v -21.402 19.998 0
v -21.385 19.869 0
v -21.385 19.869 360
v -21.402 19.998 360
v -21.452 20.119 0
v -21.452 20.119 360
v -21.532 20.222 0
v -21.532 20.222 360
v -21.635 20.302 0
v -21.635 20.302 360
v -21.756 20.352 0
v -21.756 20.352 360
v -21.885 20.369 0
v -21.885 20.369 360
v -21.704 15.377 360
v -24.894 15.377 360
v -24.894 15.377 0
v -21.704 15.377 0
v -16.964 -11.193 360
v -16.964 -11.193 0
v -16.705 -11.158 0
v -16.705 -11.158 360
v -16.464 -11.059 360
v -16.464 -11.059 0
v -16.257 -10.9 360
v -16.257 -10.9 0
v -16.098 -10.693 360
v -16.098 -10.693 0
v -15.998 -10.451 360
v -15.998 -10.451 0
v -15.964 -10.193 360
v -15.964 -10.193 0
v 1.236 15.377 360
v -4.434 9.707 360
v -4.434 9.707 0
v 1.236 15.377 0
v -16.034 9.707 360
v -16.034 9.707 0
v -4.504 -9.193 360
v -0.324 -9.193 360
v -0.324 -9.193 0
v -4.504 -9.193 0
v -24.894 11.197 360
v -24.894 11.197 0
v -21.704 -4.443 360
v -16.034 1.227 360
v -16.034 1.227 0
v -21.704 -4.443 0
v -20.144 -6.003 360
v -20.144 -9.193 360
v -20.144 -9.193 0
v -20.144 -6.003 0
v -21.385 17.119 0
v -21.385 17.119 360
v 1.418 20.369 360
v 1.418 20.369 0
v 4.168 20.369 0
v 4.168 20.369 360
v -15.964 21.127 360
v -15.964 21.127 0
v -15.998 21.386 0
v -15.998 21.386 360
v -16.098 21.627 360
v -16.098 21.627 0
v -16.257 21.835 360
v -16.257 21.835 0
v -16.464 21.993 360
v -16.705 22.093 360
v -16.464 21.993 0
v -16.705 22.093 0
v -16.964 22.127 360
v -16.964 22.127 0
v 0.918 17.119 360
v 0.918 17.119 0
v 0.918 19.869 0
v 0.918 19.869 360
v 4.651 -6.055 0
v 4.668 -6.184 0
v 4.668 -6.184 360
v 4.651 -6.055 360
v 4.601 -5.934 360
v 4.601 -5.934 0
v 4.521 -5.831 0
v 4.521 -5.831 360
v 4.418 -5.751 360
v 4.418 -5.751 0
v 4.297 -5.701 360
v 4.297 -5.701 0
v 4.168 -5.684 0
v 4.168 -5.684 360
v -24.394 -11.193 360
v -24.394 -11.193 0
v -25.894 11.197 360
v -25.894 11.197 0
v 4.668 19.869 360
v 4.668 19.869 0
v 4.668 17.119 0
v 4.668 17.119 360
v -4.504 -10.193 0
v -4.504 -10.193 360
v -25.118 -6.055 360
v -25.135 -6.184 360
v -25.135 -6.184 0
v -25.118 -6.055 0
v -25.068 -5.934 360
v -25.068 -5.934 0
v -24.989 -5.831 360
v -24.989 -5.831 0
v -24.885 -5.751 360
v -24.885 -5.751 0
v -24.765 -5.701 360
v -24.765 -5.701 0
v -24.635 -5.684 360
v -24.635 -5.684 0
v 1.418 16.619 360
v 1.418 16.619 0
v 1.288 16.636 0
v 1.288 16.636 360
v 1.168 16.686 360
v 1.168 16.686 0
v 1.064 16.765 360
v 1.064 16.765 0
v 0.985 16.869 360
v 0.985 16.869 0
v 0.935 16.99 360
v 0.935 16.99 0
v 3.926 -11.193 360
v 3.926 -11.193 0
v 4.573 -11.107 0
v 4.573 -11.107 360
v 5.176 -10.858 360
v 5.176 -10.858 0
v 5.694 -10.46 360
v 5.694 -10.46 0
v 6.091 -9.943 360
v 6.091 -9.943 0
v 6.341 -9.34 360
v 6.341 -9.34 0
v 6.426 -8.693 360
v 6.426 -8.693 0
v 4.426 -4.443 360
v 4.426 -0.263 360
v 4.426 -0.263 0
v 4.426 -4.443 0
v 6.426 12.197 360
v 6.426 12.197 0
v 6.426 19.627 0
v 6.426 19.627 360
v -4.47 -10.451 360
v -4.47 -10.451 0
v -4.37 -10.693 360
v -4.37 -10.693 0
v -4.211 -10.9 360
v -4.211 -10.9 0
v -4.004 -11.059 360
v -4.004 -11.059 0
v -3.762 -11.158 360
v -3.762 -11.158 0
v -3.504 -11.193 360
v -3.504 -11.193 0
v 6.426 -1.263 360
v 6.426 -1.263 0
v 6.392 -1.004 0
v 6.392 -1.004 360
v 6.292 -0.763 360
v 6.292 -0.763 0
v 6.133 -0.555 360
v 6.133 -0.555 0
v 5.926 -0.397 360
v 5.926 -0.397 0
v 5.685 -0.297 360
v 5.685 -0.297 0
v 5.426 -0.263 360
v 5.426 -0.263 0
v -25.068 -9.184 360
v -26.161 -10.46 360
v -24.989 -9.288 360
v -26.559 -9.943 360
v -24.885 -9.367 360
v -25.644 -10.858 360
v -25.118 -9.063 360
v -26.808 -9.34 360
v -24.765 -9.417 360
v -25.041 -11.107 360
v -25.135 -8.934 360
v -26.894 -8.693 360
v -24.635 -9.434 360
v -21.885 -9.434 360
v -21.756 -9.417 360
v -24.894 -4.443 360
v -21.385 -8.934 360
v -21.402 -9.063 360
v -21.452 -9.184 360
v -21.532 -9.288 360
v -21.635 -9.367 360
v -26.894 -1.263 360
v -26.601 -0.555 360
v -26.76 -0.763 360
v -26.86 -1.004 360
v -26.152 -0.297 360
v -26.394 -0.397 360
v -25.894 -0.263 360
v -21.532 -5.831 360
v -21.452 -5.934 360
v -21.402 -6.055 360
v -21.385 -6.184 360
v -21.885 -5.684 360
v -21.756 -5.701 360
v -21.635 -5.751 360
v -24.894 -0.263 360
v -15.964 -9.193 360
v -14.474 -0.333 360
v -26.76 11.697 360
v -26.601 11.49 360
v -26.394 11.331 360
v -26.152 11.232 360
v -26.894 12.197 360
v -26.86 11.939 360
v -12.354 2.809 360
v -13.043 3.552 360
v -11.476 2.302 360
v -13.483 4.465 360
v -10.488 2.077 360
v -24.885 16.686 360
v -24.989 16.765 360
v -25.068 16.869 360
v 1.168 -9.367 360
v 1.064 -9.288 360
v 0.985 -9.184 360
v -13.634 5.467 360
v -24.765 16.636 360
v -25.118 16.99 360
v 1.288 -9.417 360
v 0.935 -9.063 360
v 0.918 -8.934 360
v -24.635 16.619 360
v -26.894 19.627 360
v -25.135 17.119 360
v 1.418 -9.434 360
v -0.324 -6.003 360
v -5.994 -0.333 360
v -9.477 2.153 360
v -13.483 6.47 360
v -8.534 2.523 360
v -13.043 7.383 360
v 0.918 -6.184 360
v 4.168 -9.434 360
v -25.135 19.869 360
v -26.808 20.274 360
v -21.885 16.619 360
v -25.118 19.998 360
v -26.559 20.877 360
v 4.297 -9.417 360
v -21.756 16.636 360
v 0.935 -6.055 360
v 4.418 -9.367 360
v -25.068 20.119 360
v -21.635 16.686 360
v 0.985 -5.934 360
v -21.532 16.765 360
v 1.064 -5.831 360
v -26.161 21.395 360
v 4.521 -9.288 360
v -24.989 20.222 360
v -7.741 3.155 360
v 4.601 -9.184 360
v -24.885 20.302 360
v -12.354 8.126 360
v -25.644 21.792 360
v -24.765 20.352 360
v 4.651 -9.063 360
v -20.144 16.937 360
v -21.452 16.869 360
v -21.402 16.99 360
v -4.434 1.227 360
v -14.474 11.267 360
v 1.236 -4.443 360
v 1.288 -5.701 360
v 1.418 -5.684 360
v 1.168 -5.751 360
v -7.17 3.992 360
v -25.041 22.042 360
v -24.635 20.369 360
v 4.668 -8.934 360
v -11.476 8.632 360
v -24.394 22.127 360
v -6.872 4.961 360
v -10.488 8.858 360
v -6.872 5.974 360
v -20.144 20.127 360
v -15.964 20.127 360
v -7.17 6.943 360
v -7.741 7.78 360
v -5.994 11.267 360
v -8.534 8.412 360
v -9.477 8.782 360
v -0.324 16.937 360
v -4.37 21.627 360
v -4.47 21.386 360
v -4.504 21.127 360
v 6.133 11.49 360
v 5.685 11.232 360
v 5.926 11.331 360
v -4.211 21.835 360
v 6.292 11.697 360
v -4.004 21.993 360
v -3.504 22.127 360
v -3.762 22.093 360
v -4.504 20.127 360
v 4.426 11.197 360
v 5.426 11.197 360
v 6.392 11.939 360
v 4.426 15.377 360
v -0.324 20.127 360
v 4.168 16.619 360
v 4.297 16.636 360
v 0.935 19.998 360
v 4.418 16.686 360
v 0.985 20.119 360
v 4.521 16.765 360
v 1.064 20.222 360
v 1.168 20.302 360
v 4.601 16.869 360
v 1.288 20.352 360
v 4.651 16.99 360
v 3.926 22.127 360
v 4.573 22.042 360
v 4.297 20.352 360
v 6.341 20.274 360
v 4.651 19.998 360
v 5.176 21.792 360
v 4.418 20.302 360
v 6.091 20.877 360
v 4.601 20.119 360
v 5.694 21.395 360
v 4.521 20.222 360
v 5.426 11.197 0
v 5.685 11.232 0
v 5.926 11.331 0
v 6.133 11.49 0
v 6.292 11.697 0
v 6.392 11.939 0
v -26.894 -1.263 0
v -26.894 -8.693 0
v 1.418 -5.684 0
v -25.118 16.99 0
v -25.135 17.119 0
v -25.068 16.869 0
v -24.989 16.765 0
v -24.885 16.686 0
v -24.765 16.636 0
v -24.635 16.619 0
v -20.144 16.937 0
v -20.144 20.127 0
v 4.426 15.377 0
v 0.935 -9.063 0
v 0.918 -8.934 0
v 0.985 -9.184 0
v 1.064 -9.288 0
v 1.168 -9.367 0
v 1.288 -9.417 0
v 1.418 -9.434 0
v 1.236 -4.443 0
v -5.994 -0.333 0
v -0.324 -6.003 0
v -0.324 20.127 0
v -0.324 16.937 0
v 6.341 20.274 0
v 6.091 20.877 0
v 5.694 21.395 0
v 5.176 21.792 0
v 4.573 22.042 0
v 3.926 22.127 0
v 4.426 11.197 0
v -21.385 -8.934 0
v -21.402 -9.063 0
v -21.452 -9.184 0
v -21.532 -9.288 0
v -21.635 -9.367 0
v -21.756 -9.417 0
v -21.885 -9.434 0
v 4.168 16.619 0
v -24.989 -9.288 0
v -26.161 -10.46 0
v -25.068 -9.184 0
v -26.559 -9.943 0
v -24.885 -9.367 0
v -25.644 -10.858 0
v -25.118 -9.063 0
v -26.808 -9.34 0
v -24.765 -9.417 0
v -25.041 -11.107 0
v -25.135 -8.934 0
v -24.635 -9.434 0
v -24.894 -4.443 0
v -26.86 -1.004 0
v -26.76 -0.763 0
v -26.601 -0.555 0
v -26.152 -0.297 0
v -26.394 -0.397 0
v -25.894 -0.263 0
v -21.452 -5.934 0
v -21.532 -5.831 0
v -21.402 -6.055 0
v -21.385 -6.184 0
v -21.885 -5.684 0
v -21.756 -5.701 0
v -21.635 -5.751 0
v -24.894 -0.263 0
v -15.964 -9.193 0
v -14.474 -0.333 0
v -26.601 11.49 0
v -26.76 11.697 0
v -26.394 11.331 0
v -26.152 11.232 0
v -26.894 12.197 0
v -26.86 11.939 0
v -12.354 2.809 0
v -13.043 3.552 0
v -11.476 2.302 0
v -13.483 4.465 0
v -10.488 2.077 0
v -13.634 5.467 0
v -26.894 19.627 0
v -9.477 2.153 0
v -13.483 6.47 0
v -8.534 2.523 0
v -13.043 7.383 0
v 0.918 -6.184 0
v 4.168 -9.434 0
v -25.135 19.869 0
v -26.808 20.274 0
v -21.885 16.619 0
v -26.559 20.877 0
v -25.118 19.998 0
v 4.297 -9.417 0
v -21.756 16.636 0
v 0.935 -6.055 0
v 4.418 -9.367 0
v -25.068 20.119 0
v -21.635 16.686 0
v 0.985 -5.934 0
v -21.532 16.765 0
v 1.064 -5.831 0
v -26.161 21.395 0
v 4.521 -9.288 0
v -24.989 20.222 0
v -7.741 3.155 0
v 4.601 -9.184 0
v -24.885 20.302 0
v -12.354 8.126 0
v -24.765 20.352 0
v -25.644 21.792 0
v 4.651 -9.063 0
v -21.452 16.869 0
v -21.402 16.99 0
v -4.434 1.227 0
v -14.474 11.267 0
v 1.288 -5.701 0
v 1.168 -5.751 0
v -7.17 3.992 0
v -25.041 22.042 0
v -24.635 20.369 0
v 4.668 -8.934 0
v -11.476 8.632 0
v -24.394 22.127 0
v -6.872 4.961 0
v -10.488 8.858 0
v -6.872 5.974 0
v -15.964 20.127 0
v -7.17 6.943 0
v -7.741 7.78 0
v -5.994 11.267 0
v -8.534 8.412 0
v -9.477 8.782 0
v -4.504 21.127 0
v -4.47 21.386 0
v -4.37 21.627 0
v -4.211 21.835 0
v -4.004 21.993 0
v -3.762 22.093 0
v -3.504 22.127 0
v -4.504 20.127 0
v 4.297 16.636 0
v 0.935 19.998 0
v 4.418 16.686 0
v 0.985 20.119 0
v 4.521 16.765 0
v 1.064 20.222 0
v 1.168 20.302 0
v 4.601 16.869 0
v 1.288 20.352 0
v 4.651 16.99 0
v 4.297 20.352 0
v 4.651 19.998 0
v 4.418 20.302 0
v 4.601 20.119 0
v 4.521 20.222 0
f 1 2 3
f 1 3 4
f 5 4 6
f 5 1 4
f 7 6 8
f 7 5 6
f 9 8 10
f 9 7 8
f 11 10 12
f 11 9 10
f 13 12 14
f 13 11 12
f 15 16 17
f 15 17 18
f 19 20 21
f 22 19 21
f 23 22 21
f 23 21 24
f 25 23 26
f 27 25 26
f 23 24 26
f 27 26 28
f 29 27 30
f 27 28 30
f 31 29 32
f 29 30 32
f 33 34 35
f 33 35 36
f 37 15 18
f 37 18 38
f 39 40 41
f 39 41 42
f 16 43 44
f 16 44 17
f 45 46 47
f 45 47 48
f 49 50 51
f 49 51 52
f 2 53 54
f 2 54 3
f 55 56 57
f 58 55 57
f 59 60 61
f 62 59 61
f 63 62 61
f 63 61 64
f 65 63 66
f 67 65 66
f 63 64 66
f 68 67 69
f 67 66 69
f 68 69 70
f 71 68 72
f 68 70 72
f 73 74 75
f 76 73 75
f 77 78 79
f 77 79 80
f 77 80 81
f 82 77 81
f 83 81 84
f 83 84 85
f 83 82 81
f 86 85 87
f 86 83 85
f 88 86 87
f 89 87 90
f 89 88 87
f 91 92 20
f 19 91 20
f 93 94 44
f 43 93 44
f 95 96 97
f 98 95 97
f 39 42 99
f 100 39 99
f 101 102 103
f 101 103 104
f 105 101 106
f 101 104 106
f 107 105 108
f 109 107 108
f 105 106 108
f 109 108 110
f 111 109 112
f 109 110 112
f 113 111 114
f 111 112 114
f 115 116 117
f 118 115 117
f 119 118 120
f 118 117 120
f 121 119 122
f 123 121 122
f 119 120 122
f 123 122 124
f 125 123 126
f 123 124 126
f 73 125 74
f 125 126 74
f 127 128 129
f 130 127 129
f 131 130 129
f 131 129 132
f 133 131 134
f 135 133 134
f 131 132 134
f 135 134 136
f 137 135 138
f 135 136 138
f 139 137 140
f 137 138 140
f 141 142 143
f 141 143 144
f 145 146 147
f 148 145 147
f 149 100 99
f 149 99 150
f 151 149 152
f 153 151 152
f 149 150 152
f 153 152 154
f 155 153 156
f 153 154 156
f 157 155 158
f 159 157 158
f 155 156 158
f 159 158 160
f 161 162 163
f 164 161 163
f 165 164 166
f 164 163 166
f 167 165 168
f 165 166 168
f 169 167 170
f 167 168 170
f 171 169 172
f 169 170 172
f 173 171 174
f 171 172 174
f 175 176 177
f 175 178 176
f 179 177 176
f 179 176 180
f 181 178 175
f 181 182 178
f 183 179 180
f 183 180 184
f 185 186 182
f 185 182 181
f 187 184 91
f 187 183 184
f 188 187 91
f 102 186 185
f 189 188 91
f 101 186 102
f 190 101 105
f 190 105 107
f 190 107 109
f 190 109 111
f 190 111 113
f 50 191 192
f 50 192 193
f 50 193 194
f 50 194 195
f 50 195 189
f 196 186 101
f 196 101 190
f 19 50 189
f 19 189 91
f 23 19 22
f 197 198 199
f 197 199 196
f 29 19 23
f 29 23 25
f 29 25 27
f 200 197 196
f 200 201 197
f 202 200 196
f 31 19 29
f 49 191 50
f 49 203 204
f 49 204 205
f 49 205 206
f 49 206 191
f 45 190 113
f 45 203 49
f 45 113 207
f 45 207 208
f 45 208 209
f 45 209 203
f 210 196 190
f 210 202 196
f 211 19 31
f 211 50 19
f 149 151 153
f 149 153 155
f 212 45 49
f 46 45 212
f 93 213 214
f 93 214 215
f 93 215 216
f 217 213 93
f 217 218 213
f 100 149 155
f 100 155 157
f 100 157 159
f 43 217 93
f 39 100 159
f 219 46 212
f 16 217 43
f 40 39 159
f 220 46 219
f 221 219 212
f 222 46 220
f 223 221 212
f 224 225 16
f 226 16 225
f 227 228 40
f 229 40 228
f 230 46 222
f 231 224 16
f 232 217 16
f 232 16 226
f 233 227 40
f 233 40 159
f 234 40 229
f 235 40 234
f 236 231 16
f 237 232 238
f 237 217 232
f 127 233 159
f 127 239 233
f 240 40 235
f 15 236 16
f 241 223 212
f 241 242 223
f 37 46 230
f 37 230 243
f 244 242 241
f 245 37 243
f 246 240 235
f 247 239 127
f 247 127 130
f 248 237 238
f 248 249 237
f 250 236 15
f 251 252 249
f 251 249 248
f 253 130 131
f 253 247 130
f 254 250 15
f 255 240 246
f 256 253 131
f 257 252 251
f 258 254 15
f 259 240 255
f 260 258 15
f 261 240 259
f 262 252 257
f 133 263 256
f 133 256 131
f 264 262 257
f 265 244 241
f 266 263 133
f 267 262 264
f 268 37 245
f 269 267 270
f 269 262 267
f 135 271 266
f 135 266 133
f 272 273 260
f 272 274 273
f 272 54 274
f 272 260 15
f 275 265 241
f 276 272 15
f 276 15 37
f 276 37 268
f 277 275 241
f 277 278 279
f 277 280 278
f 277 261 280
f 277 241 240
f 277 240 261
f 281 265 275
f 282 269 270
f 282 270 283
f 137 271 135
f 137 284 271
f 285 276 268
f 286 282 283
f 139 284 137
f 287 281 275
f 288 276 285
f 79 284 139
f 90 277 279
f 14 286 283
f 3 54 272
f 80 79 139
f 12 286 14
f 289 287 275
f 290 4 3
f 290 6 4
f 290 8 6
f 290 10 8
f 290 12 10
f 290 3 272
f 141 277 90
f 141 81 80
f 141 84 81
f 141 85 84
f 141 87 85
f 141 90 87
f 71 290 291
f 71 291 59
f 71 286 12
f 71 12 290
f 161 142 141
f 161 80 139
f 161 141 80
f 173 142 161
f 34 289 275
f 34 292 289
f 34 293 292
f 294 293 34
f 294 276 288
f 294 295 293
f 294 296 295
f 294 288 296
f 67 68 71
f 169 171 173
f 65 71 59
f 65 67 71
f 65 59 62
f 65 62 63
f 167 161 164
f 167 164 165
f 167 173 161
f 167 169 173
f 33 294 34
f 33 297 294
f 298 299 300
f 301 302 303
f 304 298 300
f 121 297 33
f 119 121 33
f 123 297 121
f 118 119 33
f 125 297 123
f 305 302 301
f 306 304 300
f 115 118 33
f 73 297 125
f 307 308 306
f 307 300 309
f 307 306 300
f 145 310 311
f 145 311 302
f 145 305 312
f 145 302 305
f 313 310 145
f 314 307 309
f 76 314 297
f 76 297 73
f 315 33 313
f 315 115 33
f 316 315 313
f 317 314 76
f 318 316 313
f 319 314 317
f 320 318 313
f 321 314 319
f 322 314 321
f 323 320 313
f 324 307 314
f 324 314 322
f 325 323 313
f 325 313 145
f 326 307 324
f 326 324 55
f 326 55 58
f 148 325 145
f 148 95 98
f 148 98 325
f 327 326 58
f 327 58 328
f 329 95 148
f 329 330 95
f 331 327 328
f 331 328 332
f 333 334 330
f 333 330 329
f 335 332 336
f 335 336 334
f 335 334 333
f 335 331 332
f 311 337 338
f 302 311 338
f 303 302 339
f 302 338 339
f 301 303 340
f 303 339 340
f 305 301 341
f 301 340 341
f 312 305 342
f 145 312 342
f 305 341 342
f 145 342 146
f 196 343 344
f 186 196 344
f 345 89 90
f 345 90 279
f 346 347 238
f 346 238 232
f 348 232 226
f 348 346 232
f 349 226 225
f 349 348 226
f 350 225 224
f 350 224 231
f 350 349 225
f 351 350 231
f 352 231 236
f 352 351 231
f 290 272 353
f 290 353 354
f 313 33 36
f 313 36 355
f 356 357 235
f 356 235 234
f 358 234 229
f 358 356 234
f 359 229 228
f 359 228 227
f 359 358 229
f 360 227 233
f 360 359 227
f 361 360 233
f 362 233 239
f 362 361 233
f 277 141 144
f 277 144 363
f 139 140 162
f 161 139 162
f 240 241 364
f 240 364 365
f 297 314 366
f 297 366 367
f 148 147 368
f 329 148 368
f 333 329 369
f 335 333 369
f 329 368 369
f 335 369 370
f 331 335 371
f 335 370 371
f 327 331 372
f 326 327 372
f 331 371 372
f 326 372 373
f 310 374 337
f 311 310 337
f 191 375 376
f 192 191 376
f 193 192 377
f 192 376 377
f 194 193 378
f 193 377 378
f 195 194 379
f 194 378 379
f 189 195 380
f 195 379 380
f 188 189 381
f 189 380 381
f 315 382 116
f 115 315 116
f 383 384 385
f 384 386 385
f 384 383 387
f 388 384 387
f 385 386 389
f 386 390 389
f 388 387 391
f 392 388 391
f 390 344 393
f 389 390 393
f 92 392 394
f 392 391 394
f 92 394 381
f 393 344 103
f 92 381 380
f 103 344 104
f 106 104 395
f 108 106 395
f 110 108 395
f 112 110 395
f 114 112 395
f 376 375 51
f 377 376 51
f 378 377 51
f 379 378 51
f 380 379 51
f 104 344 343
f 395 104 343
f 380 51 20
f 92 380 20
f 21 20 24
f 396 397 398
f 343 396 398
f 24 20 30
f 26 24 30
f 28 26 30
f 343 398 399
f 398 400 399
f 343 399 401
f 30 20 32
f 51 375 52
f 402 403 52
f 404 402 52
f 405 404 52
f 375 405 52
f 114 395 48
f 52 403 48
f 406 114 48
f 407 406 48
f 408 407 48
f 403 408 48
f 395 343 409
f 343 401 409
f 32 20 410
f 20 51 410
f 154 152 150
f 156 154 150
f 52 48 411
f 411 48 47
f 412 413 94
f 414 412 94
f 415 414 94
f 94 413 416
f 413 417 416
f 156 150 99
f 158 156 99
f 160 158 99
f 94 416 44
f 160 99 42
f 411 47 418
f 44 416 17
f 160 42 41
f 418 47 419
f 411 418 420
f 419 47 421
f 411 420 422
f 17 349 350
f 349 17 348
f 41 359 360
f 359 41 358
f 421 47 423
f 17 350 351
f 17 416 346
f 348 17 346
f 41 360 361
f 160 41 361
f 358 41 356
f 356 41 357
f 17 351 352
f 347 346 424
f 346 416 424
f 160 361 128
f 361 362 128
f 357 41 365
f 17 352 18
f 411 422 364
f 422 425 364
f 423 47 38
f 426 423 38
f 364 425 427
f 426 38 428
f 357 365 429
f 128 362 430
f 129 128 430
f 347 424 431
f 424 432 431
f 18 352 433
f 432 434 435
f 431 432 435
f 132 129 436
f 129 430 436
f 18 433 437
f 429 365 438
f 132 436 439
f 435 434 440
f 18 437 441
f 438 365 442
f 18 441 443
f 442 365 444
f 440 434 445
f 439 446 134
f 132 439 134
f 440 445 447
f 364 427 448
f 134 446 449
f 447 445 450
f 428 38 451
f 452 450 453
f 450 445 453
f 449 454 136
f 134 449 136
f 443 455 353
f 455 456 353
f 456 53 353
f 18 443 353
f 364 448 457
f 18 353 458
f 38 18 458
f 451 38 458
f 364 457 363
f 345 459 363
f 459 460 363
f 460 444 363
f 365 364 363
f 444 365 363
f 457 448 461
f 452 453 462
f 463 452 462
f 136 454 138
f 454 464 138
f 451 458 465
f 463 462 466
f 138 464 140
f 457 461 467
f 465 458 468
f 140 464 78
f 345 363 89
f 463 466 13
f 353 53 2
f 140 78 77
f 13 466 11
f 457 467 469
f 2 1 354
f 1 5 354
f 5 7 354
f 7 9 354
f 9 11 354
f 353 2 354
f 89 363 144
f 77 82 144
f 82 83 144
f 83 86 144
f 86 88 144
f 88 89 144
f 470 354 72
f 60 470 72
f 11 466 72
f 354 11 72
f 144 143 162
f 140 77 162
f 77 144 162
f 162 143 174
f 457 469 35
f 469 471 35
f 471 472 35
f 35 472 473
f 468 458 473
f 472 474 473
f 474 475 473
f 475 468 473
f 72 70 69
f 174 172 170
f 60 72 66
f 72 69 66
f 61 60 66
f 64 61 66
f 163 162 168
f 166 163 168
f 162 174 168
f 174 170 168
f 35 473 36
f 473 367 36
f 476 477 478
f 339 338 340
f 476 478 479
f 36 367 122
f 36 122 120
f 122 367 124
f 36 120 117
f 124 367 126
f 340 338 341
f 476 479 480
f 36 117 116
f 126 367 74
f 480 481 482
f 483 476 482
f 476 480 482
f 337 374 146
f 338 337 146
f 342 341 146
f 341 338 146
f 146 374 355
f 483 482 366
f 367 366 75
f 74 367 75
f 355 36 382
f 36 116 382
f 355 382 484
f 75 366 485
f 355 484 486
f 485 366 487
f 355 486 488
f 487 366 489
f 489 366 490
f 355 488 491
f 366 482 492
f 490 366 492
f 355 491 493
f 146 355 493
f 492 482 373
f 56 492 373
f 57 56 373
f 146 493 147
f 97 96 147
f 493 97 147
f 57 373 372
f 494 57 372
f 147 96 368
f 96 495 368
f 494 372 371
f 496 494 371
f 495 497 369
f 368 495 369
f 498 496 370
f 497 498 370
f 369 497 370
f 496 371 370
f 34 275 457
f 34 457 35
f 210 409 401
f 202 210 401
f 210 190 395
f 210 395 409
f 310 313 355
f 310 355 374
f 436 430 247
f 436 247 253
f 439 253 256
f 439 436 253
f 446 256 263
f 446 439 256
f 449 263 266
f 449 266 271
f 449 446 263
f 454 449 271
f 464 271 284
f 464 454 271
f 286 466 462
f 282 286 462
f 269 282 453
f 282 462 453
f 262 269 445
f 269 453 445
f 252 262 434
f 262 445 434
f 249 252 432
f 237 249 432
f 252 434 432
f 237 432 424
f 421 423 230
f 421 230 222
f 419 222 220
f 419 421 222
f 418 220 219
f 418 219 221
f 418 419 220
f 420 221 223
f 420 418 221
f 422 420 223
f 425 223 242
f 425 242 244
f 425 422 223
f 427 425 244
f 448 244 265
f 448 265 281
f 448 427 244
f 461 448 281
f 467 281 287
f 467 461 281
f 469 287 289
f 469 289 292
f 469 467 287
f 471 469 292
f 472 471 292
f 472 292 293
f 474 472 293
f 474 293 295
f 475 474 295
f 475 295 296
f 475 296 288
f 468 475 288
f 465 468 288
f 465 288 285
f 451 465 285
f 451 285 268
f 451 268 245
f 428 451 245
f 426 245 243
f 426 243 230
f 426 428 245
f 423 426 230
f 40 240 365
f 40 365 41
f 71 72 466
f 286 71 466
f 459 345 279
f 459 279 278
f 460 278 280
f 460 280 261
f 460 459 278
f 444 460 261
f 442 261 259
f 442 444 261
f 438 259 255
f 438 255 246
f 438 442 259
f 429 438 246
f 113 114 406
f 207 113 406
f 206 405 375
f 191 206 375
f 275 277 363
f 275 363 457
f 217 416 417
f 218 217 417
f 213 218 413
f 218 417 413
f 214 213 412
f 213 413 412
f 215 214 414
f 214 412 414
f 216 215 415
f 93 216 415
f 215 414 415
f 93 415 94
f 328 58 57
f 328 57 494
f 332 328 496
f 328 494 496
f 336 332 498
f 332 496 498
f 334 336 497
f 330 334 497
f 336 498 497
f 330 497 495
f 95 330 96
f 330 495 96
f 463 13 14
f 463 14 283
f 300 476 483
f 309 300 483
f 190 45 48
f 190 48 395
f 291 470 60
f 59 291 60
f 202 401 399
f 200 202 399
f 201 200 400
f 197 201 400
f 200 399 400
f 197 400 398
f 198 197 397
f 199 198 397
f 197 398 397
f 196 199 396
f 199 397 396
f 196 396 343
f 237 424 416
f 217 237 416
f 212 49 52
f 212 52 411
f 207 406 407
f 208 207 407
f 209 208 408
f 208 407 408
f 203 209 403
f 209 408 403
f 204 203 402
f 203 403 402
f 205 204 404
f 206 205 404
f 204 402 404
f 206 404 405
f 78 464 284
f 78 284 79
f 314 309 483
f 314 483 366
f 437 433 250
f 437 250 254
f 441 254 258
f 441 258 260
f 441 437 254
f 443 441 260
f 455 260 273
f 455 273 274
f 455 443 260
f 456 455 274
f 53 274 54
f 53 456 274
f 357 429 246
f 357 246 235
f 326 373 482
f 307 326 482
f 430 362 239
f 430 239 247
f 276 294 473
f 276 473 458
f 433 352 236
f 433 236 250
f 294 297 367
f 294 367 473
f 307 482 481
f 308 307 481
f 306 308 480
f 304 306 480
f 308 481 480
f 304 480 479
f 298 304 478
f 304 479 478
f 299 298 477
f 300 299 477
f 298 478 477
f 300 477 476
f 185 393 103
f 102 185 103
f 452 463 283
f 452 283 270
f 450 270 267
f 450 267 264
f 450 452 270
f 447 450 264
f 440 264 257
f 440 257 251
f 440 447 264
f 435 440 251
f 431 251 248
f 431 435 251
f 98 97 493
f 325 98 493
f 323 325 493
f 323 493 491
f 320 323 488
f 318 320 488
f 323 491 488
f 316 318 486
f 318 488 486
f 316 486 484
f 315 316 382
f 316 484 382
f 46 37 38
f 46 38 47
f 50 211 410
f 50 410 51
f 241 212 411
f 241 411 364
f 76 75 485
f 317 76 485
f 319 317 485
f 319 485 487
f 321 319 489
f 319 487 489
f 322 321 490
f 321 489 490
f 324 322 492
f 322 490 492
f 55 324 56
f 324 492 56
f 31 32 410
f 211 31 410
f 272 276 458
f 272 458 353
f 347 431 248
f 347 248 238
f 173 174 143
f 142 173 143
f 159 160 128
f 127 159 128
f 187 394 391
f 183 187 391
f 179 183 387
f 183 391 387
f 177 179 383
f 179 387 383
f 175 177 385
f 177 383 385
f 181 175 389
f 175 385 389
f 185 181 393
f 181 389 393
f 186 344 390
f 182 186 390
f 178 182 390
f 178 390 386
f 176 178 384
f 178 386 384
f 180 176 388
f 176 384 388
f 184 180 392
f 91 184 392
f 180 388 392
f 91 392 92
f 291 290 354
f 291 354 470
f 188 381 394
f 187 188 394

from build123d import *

# Parameters (mm, degrees)
CROQUIS1_R              = 3.4
SALIENTE_EXTRUIR1_DEPTH = 360


with BuildPart() as part:
    # Croquis1 → Saliente-Extruir1 (new body)
    with BuildSketch(Plane.XY):
        with BuildLine():
            Line((-4.433640906, 1.227432273), (-4.433640906, 9.707432273))
            Line((-4.433640906, 9.707432273), (1.236359094, 15.377432273))
            Line((1.236359094, 15.377432273), (4.426359094, 15.377432273))
            Line((4.426359094, 15.377432273), (4.426359094, 11.197432273))
            Line((4.426359094, 11.197432273), (5.426359094, 11.197432273))
            ThreePointArc((5.426359094, 11.197432273), (6.133465875, 11.490325492), (6.426359094, 12.197432273))
            Line((6.426359094, 12.197432273), (6.426359094, 19.627432273))
            ThreePointArc((6.426359094, 19.627432273), (5.694126047, 21.395199226), (3.926359094, 22.127432273))
            Line((3.926359094, 22.127432273), (-3.503640906, 22.127432273))
            ThreePointArc((-3.503640906, 22.127432273), (-4.210747688, 21.834539054), (-4.503640906, 21.127432273))
            Line((-4.503640906, 21.127432273), (-4.503640906, 20.127432273))
            Line((-4.503640906, 20.127432273), (-0.323640906, 20.127432273))
            Line((-0.323640906, 20.127432273), (-0.323640906, 16.937432273))
            Line((-0.323640906, 16.937432273), (-5.993640906, 11.267432273))
            Line((-5.993640906, 11.267432273), (-14.473640906, 11.267432273))
            Line((-14.473640906, 11.267432273), (-20.143640906, 16.937432273))
            Line((-20.143640906, 16.937432273), (-20.143640906, 20.127432273))
            Line((-20.143640906, 20.127432273), (-15.963640906, 20.127432273))
            Line((-15.963640906, 20.127432273), (-15.963640906, 21.127432273))
            ThreePointArc((-15.963640906, 21.127432273), (-16.256534125, 21.834539054), (-16.963640906, 22.127432273))
            Line((-16.963640906, 22.127432273), (-24.393640906, 22.127432273))
            ThreePointArc((-24.393640906, 22.127432273), (-26.161407859, 21.395199226), (-26.893640906, 19.627432273))
            Line((-26.893640906, 19.627432273), (-26.893640906, 12.197432273))
            ThreePointArc((-26.893640906, 12.197432273), (-26.600747688, 11.490325492), (-25.893640906, 11.197432273))
            Line((-25.893640906, 11.197432273), (-24.893640906, 11.197432273))
            Line((-24.893640906, 11.197432273), (-24.893640906, 15.377432273))
            Line((-24.893640906, 15.377432273), (-21.703640906, 15.377432273))
            Line((-21.703640906, 15.377432273), (-16.033640906, 9.707432273))
            Line((-16.033640906, 9.707432273), (-16.033640906, 1.227432273))
            Line((-16.033640906, 1.227432273), (-21.703640906, -4.442567727))
            Line((-21.703640906, -4.442567727), (-24.893640906, -4.442567727))
            Line((-24.893640906, -4.442567727), (-24.893640906, -0.262567727))
            Line((-24.893640906, -0.262567727), (-25.893640906, -0.262567727))
            ThreePointArc((-25.893640906, -0.262567727), (-26.600747688, -0.555460946), (-26.893640906, -1.262567727))
            Line((-26.893640906, -1.262567727), (-26.893640906, -8.692567727))
            ThreePointArc((-26.893640906, -8.692567727), (-26.161407859, -10.46033468), (-24.393640906, -11.192567727))
            Line((-24.393640906, -11.192567727), (-16.963640906, -11.192567727))
            ThreePointArc((-16.963640906, -11.192567727), (-16.256534125, -10.899674508), (-15.963640906, -10.192567727))
            Line((-15.963640906, -10.192567727), (-15.963640906, -9.192567727))
            Line((-15.963640906, -9.192567727), (-20.143640906, -9.192567727))
            Line((-20.143640906, -9.192567727), (-20.143640906, -6.002567727))
            Line((-20.143640906, -6.002567727), (-14.473640906, -0.332567727))
            Line((-14.473640906, -0.332567727), (-5.993640906, -0.332567727))
            Line((-5.993640906, -0.332567727), (-0.323640906, -6.002567727))
            Line((-0.323640906, -6.002567727), (-0.323640906, -9.192567727))
            Line((-0.323640906, -9.192567727), (-4.503640906, -9.192567727))
            Line((-4.503640906, -9.192567727), (-4.503640906, -10.192567727))
            ThreePointArc((-4.503640906, -10.192567727), (-4.210747688, -10.899674508), (-3.503640906, -11.192567727))
            Line((-3.503640906, -11.192567727), (3.926359094, -11.192567727))
            ThreePointArc((3.926359094, -11.192567727), (5.694126047, -10.46033468), (6.426359094, -8.692567727))
            Line((6.426359094, -8.692567727), (6.426359094, -1.262567727))
            ThreePointArc((6.426359094, -1.262567727), (6.133465875, -0.555460946), (5.426359094, -0.262567727))
            Line((5.426359094, -0.262567727), (4.426359094, -0.262567727))
            Line((4.426359094, -0.262567727), (4.426359094, -4.442567727))
            Line((4.426359094, -4.442567727), (1.236359094, -4.442567727))
            Line((1.236359094, -4.442567727), (-4.433640906, 1.227432273))
        make_face()
        with Locations(Location((-10.233640906, 5.467432273, 0), (0, 0, 180))):
            Circle(CROQUIS1_R, mode=Mode.SUBTRACT)
        with BuildLine():
            Line((1.417854227, 20.368927407), (4.167854227, 20.368927407))
            ThreePointArc((4.167854227, 20.368927407), (4.521407618, 20.222480798), (4.667854227, 19.868927407))
            Line((4.667854227, 19.868927407), (4.667854227, 17.118927407))
            ThreePointArc((4.667854227, 17.118927407), (4.521407618, 16.765374016), (4.167854227, 16.618927407))
            Line((4.167854227, 16.618927407), (1.417854227, 16.618927407))
            ThreePointArc((1.417854227, 16.618927407), (1.064300837, 16.765374016), (0.917854227, 17.118927407))
            Line((0.917854227, 17.118927407), (0.917854227, 19.868927407))
            ThreePointArc((0.917854227, 19.868927407), (1.064300837, 20.222480798), (1.417854227, 20.368927407))
        make_face(mode=Mode.SUBTRACT)
        with BuildLine():
            Line((-25.13513604, 19.868927407), (-25.13513604, 17.118927407))
            ThreePointArc((-25.13513604, 17.118927407), (-24.988689431, 16.765374016), (-24.63513604, 16.618927407))
            Line((-24.63513604, 16.618927407), (-21.88513604, 16.618927407))
            ThreePointArc((-21.88513604, 16.618927407), (-21.531582649, 16.765374016), (-21.38513604, 17.118927407))
            Line((-21.38513604, 17.118927407), (-21.38513604, 19.868927407))
            ThreePointArc((-21.38513604, 19.868927407), (-21.531582649, 20.222480798), (-21.88513604, 20.368927407))
            Line((-21.88513604, 20.368927407), (-24.63513604, 20.368927407))
            ThreePointArc((-24.63513604, 20.368927407), (-24.988689431, 20.222480798), (-25.13513604, 19.868927407))
        make_face(mode=Mode.SUBTRACT)
        with BuildLine():
            Line((-21.88513604, -9.43406286), (-24.63513604, -9.43406286))
            ThreePointArc((-24.63513604, -9.43406286), (-24.988689431, -9.287616251), (-25.13513604, -8.93406286))
            Line((-25.13513604, -8.93406286), (-25.13513604, -6.18406286))
            ThreePointArc((-25.13513604, -6.18406286), (-24.988689431, -5.83050947), (-24.63513604, -5.68406286))
            Line((-24.63513604, -5.68406286), (-21.88513604, -5.68406286))
            ThreePointArc((-21.88513604, -5.68406286), (-21.531582649, -5.83050947), (-21.38513604, -6.18406286))
            Line((-21.38513604, -6.18406286), (-21.38513604, -8.93406286))
            ThreePointArc((-21.38513604, -8.93406286), (-21.531582649, -9.287616251), (-21.88513604, -9.43406286))
        make_face(mode=Mode.SUBTRACT)
        with BuildLine():
            Line((4.667854227, -8.93406286), (4.667854227, -6.18406286))
            ThreePointArc((4.667854227, -6.18406286), (4.521407618, -5.83050947), (4.167854227, -5.68406286))
            Line((4.167854227, -5.68406286), (1.417854227, -5.68406286))
            ThreePointArc((1.417854227, -5.68406286), (1.064300837, -5.83050947), (0.917854227, -6.18406286))
            Line((0.917854227, -6.18406286), (0.917854227, -8.93406286))
            ThreePointArc((0.917854227, -8.93406286), (1.064300837, -9.287616251), (1.417854227, -9.43406286))
            Line((1.417854227, -9.43406286), (4.167854227, -9.43406286))
            ThreePointArc((4.167854227, -9.43406286), (4.521407618, -9.287616251), (4.667854227, -8.93406286))
        make_face(mode=Mode.SUBTRACT)
    extrude(amount=SALIENTE_EXTRUIR1_DEPTH)


solid = part.part
